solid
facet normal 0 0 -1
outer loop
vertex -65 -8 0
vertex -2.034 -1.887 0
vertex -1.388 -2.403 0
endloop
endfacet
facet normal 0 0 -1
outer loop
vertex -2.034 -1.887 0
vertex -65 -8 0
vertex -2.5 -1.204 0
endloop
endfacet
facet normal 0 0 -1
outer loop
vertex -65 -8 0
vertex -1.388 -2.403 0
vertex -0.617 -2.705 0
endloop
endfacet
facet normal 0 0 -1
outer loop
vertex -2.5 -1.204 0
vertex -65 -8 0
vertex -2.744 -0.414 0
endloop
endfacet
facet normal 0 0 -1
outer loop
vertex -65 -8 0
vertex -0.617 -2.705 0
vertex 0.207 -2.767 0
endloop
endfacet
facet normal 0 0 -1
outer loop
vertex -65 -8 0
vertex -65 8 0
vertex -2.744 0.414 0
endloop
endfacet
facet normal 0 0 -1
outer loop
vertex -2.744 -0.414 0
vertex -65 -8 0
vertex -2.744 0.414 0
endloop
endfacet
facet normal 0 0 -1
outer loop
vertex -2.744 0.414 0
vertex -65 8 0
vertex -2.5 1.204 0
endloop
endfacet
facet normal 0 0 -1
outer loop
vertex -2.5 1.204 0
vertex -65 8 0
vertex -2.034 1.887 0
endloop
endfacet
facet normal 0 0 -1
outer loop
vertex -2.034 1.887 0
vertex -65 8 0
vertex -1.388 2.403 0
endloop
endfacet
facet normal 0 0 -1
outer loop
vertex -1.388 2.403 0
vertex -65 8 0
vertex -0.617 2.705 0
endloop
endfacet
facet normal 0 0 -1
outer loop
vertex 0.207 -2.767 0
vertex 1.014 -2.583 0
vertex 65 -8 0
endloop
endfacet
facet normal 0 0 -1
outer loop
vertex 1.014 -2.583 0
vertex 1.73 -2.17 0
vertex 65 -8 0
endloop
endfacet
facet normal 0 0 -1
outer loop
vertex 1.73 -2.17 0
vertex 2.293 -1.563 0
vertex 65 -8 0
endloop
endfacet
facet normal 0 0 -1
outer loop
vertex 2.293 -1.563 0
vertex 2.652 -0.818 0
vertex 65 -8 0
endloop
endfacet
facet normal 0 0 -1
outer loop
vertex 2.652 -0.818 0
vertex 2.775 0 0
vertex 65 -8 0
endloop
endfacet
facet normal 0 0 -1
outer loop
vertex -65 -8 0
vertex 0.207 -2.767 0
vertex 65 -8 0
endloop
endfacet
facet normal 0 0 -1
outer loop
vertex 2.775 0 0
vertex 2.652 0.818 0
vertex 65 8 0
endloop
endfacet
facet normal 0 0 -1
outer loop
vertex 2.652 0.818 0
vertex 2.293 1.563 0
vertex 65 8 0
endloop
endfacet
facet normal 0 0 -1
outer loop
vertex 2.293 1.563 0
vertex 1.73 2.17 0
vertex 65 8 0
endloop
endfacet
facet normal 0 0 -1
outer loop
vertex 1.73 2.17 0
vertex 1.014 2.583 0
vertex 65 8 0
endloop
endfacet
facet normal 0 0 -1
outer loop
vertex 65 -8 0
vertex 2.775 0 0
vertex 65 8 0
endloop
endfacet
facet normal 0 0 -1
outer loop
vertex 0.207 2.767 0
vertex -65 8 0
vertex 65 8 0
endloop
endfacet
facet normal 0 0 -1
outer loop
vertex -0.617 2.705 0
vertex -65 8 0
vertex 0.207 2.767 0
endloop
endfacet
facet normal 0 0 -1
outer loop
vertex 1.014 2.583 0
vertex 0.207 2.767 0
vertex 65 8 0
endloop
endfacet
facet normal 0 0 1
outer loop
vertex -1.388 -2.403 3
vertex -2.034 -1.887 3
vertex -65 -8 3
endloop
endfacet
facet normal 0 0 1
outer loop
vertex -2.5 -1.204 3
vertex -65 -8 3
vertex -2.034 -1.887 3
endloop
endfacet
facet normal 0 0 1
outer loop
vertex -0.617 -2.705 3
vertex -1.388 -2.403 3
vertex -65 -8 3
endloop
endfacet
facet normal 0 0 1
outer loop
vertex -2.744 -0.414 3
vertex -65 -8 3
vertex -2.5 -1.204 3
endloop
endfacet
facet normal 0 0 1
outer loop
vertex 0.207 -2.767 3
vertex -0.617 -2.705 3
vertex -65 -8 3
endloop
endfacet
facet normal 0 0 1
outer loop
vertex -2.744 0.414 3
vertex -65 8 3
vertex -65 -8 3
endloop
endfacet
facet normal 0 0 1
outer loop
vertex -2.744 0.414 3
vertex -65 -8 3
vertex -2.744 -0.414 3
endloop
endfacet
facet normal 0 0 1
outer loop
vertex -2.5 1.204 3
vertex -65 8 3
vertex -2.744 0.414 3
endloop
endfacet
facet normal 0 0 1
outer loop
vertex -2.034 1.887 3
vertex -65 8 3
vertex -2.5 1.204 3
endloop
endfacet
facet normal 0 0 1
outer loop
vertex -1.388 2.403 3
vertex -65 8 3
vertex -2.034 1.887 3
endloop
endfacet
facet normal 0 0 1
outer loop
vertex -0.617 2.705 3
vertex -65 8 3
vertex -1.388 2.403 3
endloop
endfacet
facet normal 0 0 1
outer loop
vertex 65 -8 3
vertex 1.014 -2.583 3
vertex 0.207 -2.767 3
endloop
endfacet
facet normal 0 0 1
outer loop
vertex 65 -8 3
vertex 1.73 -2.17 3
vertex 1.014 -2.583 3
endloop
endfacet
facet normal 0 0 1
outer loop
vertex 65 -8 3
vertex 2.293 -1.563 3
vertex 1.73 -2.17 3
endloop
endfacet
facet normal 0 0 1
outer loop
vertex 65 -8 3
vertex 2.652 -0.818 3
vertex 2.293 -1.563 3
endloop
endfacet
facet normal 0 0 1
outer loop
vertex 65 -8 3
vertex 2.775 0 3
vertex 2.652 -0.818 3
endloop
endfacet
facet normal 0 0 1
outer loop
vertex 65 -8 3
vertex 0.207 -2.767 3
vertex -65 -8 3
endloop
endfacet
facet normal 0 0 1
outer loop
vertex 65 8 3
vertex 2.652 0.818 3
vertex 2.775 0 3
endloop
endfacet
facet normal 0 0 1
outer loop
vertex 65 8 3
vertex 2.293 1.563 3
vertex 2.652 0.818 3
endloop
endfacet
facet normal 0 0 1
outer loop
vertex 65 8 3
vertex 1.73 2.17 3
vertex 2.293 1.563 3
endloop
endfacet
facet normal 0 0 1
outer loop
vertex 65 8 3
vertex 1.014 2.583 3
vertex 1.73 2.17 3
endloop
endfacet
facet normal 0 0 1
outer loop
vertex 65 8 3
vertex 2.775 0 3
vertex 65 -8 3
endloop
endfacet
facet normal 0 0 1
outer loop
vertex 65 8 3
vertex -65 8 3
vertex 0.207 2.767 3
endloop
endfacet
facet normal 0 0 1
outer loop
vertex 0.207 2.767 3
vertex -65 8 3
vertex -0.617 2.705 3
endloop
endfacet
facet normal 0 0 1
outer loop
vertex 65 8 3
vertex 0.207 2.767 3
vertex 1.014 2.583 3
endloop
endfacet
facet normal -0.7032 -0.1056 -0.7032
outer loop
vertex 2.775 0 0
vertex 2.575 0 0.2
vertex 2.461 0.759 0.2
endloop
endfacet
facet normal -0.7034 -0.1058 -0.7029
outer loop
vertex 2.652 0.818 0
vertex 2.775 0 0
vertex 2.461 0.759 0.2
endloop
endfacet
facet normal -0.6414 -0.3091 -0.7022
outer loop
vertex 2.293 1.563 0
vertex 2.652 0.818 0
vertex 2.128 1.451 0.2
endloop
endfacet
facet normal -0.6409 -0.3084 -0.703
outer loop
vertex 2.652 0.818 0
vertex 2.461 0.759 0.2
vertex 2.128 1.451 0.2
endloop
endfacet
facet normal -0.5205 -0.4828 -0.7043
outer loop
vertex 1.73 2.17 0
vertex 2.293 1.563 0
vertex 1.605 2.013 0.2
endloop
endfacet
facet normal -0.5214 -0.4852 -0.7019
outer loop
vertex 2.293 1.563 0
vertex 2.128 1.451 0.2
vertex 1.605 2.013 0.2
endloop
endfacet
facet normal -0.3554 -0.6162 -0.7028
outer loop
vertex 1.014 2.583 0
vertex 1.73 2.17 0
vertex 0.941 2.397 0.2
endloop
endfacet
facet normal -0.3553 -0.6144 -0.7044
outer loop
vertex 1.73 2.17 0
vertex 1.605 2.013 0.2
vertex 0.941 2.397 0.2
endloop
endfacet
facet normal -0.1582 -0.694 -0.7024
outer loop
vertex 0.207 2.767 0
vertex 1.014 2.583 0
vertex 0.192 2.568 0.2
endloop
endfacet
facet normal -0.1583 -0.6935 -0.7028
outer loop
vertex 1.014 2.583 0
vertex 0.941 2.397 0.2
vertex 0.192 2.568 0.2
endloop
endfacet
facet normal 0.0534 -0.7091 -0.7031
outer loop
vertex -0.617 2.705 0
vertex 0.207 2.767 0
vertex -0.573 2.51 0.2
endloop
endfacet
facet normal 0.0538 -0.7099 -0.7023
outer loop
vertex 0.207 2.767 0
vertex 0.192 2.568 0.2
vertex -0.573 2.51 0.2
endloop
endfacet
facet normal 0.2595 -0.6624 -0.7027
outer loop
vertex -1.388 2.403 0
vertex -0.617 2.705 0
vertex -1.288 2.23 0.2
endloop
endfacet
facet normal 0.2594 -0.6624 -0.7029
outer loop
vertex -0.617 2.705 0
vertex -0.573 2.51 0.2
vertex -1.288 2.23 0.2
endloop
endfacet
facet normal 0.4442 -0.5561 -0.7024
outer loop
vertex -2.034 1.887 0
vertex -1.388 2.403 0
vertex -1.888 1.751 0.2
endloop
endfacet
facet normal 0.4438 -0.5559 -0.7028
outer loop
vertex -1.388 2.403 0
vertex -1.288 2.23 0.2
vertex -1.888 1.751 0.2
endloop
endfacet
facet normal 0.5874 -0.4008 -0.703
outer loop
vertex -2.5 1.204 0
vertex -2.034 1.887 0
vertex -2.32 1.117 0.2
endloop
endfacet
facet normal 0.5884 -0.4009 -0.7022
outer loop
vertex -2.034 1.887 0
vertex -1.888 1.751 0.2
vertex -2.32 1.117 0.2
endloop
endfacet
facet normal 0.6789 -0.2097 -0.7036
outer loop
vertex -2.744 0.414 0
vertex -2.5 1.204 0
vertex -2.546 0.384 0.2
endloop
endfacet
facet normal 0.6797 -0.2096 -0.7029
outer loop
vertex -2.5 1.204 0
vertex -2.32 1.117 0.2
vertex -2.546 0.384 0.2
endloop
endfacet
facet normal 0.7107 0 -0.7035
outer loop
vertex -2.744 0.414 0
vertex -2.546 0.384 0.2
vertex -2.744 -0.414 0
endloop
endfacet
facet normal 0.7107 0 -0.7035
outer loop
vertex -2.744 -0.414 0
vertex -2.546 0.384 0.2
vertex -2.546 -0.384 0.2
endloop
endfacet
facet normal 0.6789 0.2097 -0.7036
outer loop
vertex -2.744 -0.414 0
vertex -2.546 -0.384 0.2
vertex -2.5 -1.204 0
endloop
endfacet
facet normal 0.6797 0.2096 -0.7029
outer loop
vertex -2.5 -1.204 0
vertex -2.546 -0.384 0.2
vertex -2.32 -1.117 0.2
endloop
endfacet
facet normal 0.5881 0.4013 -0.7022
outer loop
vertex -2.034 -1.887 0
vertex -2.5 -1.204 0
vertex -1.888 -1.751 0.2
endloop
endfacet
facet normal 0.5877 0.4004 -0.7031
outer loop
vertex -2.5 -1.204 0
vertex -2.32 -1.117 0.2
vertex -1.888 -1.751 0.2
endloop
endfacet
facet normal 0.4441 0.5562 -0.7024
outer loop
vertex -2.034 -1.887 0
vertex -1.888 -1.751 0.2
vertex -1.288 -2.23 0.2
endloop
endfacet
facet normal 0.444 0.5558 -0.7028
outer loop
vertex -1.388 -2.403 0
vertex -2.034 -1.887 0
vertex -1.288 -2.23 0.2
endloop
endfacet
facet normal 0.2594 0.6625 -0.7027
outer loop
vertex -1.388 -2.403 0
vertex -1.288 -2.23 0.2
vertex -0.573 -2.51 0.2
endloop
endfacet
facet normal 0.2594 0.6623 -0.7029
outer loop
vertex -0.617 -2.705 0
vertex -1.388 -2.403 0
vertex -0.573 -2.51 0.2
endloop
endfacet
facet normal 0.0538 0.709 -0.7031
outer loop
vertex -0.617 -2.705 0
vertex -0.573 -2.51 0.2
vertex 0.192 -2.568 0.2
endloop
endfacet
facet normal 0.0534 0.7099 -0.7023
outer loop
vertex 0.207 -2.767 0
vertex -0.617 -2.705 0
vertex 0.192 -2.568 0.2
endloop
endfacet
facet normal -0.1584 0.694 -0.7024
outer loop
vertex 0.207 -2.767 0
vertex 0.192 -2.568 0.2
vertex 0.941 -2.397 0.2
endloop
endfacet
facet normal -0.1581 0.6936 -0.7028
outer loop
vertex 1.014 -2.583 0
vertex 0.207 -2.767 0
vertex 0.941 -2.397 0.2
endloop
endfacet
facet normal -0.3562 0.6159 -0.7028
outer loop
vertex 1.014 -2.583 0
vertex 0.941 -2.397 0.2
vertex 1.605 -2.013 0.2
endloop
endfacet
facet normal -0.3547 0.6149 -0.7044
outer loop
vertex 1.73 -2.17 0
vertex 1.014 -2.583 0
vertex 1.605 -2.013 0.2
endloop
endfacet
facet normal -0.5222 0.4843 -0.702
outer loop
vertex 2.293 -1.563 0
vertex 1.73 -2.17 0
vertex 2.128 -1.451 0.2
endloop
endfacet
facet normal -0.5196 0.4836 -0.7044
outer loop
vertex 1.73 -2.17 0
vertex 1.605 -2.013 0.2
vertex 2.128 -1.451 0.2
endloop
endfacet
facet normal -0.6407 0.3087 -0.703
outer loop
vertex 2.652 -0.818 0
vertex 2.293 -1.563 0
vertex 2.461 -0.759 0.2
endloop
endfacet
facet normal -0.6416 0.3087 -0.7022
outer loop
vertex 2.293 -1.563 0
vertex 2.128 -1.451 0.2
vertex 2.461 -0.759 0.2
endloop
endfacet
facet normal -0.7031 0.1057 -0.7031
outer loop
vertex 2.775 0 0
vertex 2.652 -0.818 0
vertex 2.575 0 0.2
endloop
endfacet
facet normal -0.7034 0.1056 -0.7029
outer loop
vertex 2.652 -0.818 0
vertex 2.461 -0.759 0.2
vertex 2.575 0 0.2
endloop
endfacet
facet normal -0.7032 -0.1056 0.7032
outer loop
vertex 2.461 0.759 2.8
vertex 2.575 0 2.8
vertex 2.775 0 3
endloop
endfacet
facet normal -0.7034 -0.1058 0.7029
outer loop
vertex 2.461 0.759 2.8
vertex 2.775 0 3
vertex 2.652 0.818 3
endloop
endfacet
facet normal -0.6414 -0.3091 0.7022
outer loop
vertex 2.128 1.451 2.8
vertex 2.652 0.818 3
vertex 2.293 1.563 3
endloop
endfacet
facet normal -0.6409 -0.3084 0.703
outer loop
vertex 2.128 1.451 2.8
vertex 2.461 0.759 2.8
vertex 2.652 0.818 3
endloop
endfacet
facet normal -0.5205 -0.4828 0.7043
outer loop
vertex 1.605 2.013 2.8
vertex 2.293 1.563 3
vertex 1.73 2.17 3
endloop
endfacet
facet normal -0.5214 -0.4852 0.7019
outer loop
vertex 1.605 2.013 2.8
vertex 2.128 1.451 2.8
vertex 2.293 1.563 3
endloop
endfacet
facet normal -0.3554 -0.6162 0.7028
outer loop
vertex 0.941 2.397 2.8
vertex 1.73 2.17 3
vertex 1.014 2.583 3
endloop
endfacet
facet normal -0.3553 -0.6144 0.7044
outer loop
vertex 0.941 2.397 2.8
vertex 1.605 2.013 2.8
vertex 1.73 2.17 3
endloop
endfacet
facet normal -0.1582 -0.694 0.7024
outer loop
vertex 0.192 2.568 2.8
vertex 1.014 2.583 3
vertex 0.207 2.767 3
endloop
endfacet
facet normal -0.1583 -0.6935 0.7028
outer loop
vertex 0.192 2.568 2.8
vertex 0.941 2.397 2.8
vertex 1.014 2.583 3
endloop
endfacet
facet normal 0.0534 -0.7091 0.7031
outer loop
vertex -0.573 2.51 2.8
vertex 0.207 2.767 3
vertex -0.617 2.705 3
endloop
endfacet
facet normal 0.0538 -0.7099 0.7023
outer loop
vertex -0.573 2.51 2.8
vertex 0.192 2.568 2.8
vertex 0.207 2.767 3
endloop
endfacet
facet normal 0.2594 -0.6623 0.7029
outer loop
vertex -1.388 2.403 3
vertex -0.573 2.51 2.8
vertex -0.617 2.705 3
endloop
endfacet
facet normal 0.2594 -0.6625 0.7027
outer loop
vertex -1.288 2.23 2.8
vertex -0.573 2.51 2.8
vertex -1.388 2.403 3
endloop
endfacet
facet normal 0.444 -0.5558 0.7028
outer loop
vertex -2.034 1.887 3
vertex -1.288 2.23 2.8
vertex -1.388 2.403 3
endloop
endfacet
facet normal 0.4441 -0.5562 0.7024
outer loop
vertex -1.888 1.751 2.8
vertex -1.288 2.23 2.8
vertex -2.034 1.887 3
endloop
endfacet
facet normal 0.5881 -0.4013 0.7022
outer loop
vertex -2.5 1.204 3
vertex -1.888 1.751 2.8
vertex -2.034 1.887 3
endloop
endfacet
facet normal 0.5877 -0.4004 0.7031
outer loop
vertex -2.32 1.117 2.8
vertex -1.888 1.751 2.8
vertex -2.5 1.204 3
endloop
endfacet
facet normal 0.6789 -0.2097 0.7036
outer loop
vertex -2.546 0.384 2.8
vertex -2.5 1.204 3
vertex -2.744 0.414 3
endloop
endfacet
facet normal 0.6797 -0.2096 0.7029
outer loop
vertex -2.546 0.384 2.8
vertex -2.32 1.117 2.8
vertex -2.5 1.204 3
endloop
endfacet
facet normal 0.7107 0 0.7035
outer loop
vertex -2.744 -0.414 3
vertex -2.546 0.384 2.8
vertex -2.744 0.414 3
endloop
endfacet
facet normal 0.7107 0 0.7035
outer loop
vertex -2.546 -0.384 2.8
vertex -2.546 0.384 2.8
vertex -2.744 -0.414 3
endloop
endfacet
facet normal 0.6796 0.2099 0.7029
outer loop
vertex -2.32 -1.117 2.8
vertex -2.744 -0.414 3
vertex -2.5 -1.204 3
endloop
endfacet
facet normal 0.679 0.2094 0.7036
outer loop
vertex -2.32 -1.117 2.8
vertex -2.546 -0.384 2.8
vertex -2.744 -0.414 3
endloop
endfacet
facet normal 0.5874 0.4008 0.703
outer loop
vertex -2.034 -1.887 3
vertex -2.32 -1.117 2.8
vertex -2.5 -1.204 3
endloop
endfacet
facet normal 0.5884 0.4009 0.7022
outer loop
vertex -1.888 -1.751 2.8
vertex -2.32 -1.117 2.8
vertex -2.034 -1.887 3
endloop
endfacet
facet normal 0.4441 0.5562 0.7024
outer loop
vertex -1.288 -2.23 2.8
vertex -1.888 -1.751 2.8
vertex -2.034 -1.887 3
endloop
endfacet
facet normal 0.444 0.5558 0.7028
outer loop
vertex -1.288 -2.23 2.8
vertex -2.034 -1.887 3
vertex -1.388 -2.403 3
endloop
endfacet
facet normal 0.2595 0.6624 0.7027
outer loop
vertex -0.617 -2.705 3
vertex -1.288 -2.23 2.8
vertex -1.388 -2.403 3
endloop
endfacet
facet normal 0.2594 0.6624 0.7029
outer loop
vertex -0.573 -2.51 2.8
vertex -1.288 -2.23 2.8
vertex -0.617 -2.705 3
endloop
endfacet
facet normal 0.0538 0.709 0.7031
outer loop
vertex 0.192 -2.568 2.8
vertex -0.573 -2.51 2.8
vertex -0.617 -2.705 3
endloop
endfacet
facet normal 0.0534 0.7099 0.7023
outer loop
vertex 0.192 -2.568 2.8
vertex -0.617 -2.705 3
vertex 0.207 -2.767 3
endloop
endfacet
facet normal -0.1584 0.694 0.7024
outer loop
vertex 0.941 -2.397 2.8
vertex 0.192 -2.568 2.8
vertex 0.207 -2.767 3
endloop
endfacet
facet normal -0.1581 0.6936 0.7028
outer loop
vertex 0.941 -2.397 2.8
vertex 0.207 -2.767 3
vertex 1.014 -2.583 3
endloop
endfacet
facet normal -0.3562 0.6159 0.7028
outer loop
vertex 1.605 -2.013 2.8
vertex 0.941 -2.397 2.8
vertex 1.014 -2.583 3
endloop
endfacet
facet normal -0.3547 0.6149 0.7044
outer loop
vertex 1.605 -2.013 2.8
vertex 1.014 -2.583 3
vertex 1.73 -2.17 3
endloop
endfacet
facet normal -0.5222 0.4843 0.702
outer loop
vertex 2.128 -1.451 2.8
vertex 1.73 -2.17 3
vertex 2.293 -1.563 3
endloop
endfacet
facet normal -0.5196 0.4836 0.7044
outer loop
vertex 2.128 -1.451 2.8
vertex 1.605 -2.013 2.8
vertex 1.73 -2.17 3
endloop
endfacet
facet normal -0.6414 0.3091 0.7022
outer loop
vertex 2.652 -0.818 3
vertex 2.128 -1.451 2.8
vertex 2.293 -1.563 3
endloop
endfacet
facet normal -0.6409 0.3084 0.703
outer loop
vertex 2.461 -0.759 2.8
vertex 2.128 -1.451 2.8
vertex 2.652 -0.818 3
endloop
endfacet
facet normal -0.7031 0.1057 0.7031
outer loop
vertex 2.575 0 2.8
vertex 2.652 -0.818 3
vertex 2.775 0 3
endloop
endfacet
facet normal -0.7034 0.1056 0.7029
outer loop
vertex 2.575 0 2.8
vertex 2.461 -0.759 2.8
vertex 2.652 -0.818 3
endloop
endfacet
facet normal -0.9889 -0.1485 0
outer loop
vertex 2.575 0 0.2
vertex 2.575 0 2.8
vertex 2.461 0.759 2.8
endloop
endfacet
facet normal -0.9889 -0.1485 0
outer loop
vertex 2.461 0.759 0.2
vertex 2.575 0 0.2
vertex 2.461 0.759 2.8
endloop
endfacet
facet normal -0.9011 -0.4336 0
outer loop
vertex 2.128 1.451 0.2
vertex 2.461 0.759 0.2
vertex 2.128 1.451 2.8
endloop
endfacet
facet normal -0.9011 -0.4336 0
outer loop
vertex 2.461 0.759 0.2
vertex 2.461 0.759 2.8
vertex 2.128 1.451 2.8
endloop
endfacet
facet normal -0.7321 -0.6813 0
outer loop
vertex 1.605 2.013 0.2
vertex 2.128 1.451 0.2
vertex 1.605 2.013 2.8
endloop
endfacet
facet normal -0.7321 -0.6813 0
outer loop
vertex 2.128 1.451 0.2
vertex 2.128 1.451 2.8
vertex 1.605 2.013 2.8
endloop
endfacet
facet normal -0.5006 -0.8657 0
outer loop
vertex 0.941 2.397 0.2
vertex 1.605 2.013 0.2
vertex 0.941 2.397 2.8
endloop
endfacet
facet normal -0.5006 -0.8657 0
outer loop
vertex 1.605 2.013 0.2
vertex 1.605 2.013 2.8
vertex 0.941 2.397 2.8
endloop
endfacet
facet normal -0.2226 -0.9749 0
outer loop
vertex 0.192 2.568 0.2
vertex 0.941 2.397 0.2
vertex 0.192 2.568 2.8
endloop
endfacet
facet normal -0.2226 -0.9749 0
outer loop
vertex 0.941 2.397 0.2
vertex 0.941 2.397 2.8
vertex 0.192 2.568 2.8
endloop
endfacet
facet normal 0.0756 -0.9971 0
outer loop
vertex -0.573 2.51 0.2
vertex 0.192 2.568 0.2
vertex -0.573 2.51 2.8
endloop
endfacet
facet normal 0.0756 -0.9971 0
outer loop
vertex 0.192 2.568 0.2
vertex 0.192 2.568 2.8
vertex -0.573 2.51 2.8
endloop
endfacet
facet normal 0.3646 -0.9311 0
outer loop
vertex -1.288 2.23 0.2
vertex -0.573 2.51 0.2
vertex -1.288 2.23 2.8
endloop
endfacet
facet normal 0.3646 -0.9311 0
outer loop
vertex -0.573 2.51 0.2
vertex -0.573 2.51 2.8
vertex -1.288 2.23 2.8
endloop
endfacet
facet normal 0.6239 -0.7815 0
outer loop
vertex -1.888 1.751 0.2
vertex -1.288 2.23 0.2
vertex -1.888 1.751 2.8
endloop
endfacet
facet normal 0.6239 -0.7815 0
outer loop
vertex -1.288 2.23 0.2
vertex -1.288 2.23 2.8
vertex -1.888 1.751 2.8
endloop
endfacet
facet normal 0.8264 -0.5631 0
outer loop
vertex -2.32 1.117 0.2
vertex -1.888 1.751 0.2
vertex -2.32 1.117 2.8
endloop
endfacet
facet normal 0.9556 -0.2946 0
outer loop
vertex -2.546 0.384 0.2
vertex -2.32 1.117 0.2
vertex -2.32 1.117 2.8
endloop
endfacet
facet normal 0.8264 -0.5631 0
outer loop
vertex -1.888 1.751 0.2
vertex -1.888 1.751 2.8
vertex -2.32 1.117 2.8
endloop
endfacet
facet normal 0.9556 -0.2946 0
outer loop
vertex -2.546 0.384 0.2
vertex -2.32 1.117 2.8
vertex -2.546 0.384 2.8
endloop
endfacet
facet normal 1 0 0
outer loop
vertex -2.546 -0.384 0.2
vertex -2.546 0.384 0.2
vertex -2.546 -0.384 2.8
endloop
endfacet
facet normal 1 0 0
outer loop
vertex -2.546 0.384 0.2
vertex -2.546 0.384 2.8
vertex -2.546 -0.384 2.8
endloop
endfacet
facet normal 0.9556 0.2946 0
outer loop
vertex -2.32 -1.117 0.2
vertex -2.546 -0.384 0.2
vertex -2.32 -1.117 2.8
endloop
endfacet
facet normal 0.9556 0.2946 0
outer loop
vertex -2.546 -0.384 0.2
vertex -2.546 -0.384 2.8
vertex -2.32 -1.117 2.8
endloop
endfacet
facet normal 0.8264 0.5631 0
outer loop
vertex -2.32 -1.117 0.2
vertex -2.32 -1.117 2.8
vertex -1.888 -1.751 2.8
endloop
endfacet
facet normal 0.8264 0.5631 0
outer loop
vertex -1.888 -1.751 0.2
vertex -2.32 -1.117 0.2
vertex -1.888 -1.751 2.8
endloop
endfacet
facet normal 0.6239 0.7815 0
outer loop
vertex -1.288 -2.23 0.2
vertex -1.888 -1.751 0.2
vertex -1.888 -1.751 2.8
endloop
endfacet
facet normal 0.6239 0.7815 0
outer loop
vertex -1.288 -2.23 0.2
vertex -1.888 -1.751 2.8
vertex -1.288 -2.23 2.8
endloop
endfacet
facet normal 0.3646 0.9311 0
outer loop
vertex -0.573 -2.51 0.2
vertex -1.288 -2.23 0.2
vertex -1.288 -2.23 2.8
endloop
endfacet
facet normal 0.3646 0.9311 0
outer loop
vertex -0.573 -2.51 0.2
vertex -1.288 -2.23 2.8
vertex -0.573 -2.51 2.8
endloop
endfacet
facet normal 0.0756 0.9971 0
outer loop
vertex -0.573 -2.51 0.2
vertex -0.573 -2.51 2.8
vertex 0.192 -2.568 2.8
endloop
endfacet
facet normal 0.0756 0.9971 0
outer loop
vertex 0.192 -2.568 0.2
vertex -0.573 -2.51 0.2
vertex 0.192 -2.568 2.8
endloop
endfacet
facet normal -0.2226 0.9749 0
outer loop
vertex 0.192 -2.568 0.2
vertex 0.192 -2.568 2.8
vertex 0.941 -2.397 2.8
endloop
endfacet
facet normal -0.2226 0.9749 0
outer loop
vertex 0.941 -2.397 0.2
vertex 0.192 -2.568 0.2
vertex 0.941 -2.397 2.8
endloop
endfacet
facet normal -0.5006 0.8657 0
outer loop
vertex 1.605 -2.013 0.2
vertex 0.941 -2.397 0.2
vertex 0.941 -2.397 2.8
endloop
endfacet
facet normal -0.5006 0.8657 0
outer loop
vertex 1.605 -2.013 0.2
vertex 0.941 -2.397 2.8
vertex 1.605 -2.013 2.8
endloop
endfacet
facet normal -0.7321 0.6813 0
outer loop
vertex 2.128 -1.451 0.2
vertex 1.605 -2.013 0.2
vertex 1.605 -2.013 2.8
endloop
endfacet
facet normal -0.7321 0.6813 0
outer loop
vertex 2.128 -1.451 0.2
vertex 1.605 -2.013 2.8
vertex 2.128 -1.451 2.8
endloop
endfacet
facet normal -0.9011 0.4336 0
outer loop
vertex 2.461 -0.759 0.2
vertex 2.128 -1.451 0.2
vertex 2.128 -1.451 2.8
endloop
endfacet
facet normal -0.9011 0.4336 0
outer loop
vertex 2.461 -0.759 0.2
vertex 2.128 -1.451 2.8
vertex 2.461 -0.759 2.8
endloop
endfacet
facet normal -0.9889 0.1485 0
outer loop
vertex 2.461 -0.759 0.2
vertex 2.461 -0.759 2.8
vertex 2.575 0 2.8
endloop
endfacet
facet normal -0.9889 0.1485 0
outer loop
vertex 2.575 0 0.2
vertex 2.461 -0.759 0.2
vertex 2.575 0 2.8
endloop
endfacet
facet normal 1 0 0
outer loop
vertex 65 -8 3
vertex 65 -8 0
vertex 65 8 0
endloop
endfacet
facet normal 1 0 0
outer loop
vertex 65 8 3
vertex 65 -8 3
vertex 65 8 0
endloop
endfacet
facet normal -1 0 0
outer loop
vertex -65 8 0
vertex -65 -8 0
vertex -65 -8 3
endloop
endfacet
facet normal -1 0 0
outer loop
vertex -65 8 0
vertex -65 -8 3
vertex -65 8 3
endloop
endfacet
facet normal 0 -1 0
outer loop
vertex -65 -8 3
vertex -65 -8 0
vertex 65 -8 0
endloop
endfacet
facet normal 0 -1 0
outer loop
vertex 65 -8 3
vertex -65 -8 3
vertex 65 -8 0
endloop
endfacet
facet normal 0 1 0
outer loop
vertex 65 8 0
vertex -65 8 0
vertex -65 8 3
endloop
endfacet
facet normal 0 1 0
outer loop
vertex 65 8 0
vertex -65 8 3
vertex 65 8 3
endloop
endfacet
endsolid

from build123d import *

# Parameters (mm, degrees)
F0_W     = 130
F0_H     = 16
F1_DEPTH = 3
F2_R     = 2.575
F3_DEPTH = 3.001
F4_SIZE  = 0.2


with BuildPart() as f1:
    # F0 (on Top) → F1 (new body)
    with BuildSketch(Plane.XY):
        Rectangle(F0_W, F0_H)
    extrude(amount=F1_DEPTH)

    # F2 (on face) → F3 (cut, through all)
    with BuildSketch(Plane.XY.offset(3)):
        Circle(F2_R)
    extrude(amount=-F3_DEPTH, mode=Mode.SUBTRACT)

    # F4
    f4_edges = [f1.edges().sort_by_distance(p)[0] for p in [
        (-2.575, 0, 3),
        (-2.575, 0, 0),
    ]]
    chamfer(f4_edges, length=F4_SIZE)


solid = f1.part
